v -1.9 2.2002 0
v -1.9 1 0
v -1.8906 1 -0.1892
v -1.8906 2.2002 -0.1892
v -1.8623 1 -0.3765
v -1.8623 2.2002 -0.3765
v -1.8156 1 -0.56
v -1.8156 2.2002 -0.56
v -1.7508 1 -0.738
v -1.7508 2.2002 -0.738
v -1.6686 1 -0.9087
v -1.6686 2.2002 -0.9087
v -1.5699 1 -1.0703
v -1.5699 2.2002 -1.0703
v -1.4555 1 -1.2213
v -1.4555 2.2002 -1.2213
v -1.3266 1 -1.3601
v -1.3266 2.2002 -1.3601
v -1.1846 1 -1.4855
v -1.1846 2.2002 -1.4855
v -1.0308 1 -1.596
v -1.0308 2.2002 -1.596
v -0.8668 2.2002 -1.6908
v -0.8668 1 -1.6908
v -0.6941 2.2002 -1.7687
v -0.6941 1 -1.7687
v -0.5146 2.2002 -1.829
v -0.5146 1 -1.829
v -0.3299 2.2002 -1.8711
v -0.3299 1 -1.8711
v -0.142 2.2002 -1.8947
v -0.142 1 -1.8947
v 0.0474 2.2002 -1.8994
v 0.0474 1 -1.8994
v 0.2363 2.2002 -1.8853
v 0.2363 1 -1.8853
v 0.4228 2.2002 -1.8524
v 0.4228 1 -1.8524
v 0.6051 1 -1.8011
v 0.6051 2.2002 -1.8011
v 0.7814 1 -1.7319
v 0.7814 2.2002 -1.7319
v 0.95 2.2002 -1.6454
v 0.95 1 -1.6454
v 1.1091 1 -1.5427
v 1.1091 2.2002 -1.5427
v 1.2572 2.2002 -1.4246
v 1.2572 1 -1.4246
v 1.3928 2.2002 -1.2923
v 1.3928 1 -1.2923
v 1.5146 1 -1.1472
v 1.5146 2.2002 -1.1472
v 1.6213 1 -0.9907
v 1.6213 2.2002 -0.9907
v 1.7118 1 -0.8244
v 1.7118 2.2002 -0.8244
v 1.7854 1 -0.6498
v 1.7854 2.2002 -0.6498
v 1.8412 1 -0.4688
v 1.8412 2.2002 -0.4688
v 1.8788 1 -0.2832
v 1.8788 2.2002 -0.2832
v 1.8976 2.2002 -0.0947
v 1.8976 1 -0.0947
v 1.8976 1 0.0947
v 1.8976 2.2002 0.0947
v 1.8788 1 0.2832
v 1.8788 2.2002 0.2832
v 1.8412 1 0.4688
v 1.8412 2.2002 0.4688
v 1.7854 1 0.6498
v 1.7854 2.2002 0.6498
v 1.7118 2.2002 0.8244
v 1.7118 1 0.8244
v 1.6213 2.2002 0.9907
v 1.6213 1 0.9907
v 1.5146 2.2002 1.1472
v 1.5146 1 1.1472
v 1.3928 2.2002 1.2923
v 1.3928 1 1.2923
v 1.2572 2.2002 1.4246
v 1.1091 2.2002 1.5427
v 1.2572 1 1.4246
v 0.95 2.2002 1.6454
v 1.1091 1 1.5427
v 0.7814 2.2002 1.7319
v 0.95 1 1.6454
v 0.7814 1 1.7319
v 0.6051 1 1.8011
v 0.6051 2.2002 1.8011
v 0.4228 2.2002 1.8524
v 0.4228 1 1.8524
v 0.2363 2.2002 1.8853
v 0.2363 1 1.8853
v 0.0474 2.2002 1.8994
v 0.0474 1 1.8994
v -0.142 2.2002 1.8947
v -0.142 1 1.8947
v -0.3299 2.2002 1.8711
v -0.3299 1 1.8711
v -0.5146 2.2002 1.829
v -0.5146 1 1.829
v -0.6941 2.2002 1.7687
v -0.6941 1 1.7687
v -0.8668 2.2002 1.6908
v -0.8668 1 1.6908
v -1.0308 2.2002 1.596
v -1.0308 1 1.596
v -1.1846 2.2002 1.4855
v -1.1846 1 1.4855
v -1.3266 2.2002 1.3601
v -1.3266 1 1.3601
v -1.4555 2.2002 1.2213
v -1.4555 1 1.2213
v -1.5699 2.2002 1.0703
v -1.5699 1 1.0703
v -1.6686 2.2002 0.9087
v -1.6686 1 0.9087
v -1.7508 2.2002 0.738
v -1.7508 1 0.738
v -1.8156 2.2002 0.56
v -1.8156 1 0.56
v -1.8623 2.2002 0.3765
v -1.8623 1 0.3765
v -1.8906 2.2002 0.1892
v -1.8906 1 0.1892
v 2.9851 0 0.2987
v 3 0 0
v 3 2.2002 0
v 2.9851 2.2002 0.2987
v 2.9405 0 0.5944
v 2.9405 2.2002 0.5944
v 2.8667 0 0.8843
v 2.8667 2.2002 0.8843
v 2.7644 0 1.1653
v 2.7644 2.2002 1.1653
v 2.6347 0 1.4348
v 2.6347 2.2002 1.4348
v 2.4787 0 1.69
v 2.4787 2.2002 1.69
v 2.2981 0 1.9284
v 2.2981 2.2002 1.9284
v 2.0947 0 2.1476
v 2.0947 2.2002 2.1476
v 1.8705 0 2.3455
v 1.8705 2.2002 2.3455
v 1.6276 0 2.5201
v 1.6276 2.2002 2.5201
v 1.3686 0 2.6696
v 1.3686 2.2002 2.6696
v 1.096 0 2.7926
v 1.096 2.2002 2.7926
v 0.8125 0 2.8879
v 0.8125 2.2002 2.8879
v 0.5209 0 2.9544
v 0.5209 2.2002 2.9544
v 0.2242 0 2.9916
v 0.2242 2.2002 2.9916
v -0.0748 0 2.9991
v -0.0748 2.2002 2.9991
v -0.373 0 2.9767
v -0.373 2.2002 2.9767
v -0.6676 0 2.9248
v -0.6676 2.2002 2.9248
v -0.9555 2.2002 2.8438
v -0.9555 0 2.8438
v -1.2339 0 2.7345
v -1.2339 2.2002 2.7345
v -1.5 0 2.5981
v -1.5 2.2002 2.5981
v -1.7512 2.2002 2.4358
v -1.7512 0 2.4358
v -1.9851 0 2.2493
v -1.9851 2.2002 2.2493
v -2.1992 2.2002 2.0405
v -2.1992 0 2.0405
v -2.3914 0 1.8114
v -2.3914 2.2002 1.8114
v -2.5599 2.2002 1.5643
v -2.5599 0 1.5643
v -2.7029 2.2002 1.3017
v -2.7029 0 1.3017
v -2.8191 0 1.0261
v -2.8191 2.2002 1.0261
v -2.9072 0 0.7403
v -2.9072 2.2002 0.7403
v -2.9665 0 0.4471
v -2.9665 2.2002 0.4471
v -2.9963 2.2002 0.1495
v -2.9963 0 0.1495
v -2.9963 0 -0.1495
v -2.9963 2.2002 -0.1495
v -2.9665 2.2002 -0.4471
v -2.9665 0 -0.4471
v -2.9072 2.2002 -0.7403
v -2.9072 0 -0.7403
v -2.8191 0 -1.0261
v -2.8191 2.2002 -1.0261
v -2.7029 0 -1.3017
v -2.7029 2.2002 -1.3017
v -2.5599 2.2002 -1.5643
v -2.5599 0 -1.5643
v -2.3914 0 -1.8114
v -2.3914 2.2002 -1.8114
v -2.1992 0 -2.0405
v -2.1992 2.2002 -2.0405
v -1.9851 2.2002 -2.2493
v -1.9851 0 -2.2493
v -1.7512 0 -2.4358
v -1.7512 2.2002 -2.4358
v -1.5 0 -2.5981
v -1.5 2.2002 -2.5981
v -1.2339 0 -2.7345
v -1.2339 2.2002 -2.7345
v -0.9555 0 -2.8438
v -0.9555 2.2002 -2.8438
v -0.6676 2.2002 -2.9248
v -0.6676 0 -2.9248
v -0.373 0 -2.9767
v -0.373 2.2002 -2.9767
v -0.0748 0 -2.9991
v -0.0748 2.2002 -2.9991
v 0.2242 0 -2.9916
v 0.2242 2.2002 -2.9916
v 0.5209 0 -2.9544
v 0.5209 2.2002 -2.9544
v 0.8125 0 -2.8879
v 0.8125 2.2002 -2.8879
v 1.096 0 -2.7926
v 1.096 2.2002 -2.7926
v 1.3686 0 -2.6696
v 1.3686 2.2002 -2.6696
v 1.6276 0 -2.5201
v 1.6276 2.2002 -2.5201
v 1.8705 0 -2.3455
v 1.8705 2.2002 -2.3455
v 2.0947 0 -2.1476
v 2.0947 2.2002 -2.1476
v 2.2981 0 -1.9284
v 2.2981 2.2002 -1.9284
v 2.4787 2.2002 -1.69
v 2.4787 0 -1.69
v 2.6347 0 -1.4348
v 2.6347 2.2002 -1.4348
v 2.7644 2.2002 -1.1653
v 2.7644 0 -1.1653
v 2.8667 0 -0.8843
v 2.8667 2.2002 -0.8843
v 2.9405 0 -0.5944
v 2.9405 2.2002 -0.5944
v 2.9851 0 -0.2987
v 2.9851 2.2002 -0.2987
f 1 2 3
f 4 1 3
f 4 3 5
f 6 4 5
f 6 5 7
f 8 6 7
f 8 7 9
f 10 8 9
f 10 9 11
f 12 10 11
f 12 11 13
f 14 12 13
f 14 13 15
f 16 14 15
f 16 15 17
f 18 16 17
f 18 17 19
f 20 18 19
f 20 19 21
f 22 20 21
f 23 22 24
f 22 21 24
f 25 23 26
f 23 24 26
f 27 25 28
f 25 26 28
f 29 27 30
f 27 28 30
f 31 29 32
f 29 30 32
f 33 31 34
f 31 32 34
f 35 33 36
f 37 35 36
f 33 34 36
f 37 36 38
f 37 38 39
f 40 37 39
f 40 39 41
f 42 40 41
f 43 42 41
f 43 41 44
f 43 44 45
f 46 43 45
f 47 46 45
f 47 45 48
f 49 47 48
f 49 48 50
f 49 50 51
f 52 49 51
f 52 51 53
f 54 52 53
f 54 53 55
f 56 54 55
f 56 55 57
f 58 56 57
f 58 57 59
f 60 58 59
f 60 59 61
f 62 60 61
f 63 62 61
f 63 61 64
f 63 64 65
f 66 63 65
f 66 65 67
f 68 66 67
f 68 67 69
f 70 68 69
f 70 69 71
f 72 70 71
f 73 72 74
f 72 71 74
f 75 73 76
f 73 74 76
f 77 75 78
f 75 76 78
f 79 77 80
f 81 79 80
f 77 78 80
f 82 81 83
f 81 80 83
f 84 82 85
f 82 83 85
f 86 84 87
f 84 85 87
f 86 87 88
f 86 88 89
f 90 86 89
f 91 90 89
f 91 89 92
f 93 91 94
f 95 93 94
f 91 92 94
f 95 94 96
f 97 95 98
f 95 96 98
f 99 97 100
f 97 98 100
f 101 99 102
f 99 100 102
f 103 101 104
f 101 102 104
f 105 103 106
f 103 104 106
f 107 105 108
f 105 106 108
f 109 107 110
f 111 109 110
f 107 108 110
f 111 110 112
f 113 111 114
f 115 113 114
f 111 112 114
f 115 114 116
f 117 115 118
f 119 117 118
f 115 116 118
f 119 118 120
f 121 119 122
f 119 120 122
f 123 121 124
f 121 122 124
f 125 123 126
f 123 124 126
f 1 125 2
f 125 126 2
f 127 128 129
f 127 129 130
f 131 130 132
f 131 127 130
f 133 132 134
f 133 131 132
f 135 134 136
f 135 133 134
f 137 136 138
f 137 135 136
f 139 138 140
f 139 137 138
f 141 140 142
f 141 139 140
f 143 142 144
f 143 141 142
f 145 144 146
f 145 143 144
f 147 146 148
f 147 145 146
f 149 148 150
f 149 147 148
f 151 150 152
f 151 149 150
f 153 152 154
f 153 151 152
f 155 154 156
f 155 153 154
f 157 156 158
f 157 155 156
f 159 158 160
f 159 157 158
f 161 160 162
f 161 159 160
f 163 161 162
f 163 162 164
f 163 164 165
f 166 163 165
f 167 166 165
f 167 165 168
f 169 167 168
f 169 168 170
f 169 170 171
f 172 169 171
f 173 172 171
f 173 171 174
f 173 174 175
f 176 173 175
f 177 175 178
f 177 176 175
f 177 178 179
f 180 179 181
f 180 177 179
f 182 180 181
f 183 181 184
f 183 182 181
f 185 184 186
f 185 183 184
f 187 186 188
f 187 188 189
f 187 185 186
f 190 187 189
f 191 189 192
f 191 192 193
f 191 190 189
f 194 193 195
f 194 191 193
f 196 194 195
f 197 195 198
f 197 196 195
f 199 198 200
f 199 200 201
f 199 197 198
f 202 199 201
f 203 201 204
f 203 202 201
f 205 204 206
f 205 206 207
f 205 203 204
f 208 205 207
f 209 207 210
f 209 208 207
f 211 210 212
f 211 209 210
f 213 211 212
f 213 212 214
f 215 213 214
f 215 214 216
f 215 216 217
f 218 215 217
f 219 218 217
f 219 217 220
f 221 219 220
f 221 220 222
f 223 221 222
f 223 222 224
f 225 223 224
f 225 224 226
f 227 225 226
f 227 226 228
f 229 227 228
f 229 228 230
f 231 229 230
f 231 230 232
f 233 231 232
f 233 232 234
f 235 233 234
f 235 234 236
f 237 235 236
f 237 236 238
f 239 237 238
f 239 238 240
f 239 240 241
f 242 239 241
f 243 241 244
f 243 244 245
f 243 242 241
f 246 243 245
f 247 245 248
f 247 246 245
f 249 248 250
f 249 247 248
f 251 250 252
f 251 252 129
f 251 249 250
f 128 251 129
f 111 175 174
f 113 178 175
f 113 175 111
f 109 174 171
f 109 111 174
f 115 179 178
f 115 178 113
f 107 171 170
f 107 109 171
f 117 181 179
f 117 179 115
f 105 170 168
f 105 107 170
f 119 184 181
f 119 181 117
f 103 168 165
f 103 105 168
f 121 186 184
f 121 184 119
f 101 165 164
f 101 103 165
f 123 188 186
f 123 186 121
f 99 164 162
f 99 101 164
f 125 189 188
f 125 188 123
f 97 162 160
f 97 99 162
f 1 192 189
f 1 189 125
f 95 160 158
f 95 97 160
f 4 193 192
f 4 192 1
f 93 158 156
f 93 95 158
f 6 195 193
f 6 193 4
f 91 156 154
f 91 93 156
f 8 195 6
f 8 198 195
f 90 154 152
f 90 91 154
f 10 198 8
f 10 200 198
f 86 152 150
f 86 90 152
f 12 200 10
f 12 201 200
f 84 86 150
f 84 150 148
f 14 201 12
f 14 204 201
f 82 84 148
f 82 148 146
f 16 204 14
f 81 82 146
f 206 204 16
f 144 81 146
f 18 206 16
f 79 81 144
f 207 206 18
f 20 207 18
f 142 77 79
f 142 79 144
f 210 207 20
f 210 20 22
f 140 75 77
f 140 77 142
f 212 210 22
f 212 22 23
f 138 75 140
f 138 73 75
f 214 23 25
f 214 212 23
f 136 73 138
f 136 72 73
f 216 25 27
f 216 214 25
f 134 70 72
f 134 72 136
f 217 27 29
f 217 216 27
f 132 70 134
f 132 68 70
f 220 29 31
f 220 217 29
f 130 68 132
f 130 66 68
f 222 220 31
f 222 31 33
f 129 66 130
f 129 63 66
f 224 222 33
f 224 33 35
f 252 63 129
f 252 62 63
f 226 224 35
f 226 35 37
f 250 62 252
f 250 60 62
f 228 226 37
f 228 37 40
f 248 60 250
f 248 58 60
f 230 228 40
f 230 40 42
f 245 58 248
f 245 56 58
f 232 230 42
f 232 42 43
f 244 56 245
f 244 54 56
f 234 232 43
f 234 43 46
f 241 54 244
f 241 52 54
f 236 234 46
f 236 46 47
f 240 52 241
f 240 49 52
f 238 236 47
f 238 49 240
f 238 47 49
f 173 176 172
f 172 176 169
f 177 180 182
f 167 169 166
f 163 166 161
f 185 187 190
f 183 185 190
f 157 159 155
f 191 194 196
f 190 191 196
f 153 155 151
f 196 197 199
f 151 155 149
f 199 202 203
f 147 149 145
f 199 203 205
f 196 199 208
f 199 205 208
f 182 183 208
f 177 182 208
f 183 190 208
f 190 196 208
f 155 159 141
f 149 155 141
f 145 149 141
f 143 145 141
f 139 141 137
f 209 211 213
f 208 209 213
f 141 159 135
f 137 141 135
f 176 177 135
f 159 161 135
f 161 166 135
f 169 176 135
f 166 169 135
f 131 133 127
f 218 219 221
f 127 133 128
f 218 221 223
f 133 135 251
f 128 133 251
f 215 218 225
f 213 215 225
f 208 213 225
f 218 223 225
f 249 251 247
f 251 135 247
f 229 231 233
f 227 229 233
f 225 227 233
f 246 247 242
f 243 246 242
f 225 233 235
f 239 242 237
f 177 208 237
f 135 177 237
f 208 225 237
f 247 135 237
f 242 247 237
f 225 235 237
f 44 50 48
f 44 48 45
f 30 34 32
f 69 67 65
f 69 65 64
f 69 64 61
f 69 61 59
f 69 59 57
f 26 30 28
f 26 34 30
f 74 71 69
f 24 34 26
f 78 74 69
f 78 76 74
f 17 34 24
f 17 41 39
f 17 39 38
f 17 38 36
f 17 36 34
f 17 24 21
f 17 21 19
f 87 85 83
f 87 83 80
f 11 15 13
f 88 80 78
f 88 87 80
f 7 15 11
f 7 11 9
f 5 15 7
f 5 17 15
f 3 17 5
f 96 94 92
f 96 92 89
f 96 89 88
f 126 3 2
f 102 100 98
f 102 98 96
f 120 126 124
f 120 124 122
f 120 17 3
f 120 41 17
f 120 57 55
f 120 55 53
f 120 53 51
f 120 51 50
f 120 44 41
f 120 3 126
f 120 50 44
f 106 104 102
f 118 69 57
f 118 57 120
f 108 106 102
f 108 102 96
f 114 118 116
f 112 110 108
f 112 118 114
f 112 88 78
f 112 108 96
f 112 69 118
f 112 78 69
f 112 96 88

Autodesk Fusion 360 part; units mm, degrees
sketch "Sketch1" plane through (0, 0, 0) normal (0, 1, 0) x (1, 0, 0)
  circle A0 centre (0, 0) radius 1.9
  circle A1 centre (0, 0) radius 3
  dimension "d1" = 3.8
  dimension "d2" = 6
extrude "Extrude1" add sketch "Sketch1" along normal blind 3 contours A0 | A1
sketch "Sketch2" plane through (0, 3, 0) normal (0, 1, 0) x (-1, 0, 0)
  circle A0 centre (0, 0) radius 3
  circle A1 centre (0, 0) radius 1.9
  dimension "d5" = 3.8
extrude "Extrude2" cut sketch "Sketch2" against normal blind 2 contours A1
sketch "Sketch3" plane through (0, 1, 0) normal (0, 1, 0) x (-1, 0, 0)
  circle A0 centre (0, 0) radius 1.9
  circle A1 centre (0, 0) radius 2
  circle A2 centre (0, 0) radius 1.9
  dimension "d8" = 4
extrude "Extrude3" cut sketch "Sketch3" along normal blind 2.2
sketch "Sketch4" plane through (0, 1, 0) normal (0, 1, 0) x (-1, 0, 0)
  circle A0 centre (0, 0) radius 2
  circle A1 centre (0, 0) radius 2.1
  dimension "d11" = 4.2
extrude "Extrude4" cut sketch "Sketch4" along normal blind 2.8
sketch "Sketch5" plane through (0, 1, 0) normal (0, 1, 0) x (-1, 0, 0)
  circle A0 centre (0, 0) radius 2.1
  circle A1 centre (0, 0) radius 1.9
  dimension "d14" = 3.8
extrude "Extrude5" add sketch "Sketch5" along normal blind 2
sketch "Sketch6" plane through (0, 0, 0) normal (0, 0, 1) x (1, 0, 0)
  line L0 (-3.6792, 2.2002) -> (4.0444, 2.2002)
  line L1 (4.0444, 2.2002) -> (4.0444, 3.7157)
  line L2 (4.0444, 3.7157) -> (-3.2227, 3.7157)
  line L3 (-3.2227, 3.7157) -> (-3.2227, 2.2002)
extrude "Extrude6" cut sketch "Sketch6" along normal blind 4.5 and the other way blind 4.5
